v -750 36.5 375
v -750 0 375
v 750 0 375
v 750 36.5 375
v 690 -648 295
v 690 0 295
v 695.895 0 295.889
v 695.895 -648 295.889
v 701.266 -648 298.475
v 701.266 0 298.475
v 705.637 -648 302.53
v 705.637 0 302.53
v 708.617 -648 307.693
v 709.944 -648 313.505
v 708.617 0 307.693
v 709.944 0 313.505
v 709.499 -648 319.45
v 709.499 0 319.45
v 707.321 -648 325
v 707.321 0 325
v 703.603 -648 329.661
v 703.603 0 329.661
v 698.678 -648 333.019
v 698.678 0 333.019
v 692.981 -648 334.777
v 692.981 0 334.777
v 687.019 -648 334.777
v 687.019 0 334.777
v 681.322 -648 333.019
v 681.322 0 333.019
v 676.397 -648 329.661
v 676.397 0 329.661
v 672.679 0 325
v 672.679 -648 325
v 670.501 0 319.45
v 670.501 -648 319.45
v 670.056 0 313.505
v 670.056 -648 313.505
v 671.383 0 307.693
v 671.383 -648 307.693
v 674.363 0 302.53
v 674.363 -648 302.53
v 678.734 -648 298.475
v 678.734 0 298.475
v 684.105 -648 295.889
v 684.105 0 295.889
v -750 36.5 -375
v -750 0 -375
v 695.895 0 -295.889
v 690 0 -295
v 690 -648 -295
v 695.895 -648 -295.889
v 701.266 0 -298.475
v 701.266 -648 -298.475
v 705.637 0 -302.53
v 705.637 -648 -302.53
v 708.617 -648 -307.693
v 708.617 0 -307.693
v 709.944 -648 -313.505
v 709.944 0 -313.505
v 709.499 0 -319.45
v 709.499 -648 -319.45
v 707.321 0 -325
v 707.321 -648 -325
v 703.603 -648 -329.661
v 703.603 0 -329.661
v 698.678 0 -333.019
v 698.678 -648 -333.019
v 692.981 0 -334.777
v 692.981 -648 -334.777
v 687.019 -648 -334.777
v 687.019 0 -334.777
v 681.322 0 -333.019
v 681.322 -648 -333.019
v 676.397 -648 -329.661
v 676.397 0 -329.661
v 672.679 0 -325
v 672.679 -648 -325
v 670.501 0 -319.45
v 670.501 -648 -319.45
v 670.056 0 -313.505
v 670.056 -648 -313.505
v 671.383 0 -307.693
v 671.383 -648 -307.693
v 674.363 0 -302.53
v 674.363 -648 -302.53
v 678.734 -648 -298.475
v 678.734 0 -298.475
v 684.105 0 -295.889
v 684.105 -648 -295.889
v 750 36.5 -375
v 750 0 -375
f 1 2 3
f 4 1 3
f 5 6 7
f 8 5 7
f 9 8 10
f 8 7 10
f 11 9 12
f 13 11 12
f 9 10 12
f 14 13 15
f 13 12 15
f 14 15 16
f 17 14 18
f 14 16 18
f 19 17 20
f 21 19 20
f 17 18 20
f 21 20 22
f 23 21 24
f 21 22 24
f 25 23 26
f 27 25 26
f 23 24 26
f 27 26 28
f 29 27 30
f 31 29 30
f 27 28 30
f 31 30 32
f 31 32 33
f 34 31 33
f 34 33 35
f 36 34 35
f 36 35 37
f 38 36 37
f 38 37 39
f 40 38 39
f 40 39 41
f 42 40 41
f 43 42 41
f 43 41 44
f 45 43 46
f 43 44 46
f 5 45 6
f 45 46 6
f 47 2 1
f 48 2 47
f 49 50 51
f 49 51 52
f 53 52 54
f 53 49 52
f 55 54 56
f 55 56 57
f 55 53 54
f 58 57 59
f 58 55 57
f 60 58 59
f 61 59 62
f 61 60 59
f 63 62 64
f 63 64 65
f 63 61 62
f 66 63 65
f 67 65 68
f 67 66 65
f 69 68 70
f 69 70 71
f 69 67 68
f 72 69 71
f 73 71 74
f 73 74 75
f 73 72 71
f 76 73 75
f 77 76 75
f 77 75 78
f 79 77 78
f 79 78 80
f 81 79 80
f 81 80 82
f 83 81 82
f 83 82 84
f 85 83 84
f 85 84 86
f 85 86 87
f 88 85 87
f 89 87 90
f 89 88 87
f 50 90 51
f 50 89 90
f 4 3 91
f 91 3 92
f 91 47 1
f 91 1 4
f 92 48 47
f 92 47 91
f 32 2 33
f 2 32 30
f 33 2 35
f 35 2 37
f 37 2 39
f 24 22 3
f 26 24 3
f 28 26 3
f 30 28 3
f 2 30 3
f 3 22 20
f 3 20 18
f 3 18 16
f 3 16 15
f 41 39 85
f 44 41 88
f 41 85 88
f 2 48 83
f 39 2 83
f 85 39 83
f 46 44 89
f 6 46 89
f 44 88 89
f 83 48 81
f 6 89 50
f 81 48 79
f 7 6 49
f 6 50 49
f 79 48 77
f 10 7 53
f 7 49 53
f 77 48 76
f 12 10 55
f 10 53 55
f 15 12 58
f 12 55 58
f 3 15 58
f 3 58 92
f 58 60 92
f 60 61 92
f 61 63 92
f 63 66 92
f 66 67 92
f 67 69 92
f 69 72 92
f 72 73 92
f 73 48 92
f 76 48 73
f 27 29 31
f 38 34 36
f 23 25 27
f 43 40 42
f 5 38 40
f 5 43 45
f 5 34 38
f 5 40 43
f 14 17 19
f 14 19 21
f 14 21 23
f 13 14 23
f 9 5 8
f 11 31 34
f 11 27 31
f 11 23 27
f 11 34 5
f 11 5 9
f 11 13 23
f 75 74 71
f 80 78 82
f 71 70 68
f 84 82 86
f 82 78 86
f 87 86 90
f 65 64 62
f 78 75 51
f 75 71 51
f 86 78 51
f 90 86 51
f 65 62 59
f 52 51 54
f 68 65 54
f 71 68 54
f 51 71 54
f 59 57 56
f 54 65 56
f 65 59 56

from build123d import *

# Parameters (mm, degrees)
SKETCH1_W           = 1500
SKETCH1_H           = 750
BOSS_EXTRUDE1_DEPTH = 36.5
SKETCH2_R           = 20
BOSS_EXTRUDE2_DEPTH = 648


with BuildPart() as part:
    # Sketch1 → Boss-Extrude1 (new body)
    with BuildSketch(Plane(origin=(0, 0, 0), x_dir=(1, 0, 0), z_dir=(0, 1, 0))):
        Rectangle(SKETCH1_W, SKETCH1_H)
    extrude(amount=BOSS_EXTRUDE1_DEPTH)

    # Sketch2 → Boss-Extrude2 (add)
    with BuildSketch(Plane.XZ):
        with Locations(Location((690, 315, 0), (0, 0, 270))):
            Circle(SKETCH2_R)
    boss_extrude2 = extrude(amount=BOSS_EXTRUDE2_DEPTH)

    # Mirror1: Boss-Extrude2 across plane
    add(boss_extrude2.mirror(Plane.XY))


solid = part.part
